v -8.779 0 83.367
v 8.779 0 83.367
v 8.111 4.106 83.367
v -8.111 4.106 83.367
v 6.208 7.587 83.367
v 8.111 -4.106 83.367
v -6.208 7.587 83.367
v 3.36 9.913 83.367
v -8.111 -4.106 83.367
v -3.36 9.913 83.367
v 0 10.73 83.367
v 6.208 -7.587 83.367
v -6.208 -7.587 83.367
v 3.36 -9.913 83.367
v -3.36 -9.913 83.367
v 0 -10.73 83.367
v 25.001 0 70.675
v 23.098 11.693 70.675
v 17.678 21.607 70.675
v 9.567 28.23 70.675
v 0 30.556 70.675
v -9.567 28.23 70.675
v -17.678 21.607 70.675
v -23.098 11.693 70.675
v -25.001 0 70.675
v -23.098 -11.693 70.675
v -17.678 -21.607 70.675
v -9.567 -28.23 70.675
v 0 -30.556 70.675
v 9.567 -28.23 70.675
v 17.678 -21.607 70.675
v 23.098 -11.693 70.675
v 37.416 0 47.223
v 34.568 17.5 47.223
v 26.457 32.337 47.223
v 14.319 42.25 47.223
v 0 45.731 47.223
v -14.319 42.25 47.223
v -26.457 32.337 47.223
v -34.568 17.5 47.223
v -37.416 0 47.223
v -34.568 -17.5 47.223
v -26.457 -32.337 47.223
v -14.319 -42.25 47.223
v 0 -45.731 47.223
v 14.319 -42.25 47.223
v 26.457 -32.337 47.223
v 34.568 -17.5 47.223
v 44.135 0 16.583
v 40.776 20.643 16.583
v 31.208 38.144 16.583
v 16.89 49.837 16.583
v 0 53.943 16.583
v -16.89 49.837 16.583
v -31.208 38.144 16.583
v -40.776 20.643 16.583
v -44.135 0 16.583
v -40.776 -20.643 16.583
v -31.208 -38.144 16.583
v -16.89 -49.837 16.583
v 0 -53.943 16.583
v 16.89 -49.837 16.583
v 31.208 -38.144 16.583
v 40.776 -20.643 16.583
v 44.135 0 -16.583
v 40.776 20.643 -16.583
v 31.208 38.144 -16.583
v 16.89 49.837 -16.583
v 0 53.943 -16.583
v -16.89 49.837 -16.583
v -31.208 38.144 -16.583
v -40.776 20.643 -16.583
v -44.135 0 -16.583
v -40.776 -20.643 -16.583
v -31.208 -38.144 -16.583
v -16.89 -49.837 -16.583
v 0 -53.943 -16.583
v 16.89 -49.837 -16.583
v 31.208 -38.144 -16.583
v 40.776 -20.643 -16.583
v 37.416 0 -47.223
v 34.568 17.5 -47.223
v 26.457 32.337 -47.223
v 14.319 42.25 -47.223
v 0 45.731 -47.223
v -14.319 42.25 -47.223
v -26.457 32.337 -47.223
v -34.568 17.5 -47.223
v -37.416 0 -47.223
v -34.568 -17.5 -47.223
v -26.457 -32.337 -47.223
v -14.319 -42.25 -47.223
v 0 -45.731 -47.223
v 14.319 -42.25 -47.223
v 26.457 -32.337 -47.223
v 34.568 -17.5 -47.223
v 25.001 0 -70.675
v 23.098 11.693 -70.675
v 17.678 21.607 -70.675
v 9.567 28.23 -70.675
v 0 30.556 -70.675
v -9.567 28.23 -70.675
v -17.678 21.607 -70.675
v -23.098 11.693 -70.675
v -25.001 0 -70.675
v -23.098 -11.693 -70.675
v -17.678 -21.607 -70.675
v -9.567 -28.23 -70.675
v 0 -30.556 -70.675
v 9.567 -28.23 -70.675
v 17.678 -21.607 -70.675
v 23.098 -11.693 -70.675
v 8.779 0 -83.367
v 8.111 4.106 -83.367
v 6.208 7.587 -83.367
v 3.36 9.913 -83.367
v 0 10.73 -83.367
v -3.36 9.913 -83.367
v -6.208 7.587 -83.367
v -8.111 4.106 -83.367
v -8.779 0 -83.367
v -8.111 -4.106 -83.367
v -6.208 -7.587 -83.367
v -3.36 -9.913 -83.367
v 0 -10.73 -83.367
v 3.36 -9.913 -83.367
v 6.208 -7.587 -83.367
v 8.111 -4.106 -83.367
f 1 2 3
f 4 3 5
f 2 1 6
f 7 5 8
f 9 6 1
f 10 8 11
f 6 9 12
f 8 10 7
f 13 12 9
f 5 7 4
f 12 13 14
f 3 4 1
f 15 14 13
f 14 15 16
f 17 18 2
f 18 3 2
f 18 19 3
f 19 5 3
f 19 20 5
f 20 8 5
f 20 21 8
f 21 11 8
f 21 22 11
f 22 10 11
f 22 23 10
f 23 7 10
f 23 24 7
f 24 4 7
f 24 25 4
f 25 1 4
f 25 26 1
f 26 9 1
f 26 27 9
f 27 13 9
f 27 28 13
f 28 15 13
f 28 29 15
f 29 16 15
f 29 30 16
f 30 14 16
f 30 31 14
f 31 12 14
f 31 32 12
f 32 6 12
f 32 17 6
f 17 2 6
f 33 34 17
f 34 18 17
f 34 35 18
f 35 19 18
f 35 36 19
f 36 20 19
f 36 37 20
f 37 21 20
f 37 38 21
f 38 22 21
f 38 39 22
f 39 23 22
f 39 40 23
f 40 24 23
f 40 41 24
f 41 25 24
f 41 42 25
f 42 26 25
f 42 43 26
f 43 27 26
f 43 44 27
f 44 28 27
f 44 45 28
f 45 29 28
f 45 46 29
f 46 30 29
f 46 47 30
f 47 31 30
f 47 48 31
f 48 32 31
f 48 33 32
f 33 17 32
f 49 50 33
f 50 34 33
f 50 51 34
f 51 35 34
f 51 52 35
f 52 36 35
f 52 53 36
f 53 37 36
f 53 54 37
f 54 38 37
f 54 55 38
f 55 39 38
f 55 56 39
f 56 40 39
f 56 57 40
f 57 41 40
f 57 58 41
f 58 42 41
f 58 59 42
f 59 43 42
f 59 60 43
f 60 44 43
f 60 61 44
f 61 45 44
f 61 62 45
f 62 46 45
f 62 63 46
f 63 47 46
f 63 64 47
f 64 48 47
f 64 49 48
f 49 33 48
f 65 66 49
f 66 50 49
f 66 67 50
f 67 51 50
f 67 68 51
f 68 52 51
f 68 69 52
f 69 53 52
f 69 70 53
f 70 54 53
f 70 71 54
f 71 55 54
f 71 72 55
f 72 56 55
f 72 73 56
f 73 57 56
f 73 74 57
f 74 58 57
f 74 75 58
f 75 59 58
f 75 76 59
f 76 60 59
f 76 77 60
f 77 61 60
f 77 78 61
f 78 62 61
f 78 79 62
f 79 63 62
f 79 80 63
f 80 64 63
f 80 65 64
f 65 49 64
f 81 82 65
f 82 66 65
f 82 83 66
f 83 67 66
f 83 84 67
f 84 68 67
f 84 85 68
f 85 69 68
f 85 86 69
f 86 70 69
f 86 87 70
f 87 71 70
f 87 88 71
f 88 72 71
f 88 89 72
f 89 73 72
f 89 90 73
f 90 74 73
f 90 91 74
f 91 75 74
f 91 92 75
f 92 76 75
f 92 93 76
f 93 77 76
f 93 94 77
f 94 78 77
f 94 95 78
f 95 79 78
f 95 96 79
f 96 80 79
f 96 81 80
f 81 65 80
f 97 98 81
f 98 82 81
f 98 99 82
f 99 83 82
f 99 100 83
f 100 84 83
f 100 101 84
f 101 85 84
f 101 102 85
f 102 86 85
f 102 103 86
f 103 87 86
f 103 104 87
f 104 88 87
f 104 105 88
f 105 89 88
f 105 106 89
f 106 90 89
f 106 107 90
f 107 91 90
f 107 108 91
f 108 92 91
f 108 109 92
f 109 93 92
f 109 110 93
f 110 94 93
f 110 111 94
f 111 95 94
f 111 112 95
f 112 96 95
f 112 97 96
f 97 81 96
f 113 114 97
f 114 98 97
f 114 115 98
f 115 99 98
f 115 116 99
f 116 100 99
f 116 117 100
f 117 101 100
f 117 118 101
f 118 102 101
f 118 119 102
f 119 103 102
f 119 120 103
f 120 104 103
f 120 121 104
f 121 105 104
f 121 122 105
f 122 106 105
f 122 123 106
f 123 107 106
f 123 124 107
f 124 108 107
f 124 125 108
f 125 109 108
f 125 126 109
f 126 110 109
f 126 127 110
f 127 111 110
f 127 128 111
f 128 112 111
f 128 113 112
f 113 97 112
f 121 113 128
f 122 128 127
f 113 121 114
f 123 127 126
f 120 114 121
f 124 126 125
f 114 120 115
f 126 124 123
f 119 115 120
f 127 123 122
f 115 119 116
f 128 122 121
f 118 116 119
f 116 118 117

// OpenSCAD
// Generated by SolidPython 1.0.1 on 2020-07-29 00:46:48


scale(v = [9, 11, 17]) {
	sphere(r = 5);
}
/***********************************************
*********      SolidPython code:      **********
************************************************
 
# import packages: SolidPython
from solid import *
from solid.utils import *
from itertools import chain, combinations, permutations


class Resize:

    def __init__(self, scad_file):
        self.scad_file = scad_file
        #self.scad_file = import_scad(scad_file)
        # cone/cylinder param:
        self.r1 = 0
        self.r2 = 0
        self.h = 0
        # rectangular prism param:
        self.w = 0
        self.l = 0
        # ellipse param:
        self.r = 0

    # import OpenScad code (file name corresponds to shape)


    # classify shape + parameters
    def assign(self, param1, param2, param3):
        if self.scad_file == 'cone.scad':
            self.r1 = param1
            self.r2 = param2
            self.h = param3
        elif self.scad_file == 'cylinder.scad':
            self.r1 = param1
            self.r2 = param2
            self.h = param3
        elif self.scad_file == 'rectangularPrism.scad':
            self.h = param1
            self.l = param2
            self.w = param3
        else:
            self.r = param1
            self.h = param2

    # resize parameters
    def iterate(self):
        x = range(3, 20, 2)
        i = 1
        if self.scad_file == 'cone.scad':
            tempList = list(permutations(x, 2))
            for temp in tempList:
                param1 = temp[0]
                param2 = temp[1]
                filepath = 'produced_scad_files/' + 'cone' + str(param1) + '_' + str(param2) + '_' + '.scad'
                scad_render_to_file(cylinder(h=param1, r1=param2, r2=0), filepath)

        elif self.scad_file == 'cylinder.scad':
            tempList = list(permutations(x, 3))
            for temp in tempList:
                param1 = temp[0]
                param2 = temp[1]
                filepath = 'produced_scad_files/' + 'cylinder' + str(param1) + '_' + str(param2) + '_' + '.scad'
                scad_render_to_file(cylinder(h=param1, r1=param2, r2=param2), filepath)

        elif self.scad_file == 'rectangularPrism.scad':
            tempList = list(permutations(x, 3))
            for temp in tempList:
                param1 = temp[0]
                param2 = temp[1]
                param3 = temp[2]
                filepath = 'produced_scad_files/' + 'rectangularPrism' + str(param1) + '_' + str(param2) + '_' + str(
                    param3) + '.scad'
                scad_render_to_file(cube(size=(param1, param2, param3)), filepath)

        elif self.scad_file == 'ellipse.scad':
            tempList = list(permutations(x, 4))
            for temp in tempList:
                param1 = temp[0]
                param2 = temp[1]
                param3 = temp[2]
                param4 = temp[3]
                filepath = 'produced_scad_files/' + 'ellipse' + str(param1) + '_' + str(param2) + '_' + str(param3) + '_' + str(param4) + '.scad'
                scad_render_to_file(scale([param1, param2, param3])(sphere(r=param4)), filepath)

    def render_to_scadfile(self):
        scad_render_to_file(scad, 'example.scad') 
 
************************************************/
